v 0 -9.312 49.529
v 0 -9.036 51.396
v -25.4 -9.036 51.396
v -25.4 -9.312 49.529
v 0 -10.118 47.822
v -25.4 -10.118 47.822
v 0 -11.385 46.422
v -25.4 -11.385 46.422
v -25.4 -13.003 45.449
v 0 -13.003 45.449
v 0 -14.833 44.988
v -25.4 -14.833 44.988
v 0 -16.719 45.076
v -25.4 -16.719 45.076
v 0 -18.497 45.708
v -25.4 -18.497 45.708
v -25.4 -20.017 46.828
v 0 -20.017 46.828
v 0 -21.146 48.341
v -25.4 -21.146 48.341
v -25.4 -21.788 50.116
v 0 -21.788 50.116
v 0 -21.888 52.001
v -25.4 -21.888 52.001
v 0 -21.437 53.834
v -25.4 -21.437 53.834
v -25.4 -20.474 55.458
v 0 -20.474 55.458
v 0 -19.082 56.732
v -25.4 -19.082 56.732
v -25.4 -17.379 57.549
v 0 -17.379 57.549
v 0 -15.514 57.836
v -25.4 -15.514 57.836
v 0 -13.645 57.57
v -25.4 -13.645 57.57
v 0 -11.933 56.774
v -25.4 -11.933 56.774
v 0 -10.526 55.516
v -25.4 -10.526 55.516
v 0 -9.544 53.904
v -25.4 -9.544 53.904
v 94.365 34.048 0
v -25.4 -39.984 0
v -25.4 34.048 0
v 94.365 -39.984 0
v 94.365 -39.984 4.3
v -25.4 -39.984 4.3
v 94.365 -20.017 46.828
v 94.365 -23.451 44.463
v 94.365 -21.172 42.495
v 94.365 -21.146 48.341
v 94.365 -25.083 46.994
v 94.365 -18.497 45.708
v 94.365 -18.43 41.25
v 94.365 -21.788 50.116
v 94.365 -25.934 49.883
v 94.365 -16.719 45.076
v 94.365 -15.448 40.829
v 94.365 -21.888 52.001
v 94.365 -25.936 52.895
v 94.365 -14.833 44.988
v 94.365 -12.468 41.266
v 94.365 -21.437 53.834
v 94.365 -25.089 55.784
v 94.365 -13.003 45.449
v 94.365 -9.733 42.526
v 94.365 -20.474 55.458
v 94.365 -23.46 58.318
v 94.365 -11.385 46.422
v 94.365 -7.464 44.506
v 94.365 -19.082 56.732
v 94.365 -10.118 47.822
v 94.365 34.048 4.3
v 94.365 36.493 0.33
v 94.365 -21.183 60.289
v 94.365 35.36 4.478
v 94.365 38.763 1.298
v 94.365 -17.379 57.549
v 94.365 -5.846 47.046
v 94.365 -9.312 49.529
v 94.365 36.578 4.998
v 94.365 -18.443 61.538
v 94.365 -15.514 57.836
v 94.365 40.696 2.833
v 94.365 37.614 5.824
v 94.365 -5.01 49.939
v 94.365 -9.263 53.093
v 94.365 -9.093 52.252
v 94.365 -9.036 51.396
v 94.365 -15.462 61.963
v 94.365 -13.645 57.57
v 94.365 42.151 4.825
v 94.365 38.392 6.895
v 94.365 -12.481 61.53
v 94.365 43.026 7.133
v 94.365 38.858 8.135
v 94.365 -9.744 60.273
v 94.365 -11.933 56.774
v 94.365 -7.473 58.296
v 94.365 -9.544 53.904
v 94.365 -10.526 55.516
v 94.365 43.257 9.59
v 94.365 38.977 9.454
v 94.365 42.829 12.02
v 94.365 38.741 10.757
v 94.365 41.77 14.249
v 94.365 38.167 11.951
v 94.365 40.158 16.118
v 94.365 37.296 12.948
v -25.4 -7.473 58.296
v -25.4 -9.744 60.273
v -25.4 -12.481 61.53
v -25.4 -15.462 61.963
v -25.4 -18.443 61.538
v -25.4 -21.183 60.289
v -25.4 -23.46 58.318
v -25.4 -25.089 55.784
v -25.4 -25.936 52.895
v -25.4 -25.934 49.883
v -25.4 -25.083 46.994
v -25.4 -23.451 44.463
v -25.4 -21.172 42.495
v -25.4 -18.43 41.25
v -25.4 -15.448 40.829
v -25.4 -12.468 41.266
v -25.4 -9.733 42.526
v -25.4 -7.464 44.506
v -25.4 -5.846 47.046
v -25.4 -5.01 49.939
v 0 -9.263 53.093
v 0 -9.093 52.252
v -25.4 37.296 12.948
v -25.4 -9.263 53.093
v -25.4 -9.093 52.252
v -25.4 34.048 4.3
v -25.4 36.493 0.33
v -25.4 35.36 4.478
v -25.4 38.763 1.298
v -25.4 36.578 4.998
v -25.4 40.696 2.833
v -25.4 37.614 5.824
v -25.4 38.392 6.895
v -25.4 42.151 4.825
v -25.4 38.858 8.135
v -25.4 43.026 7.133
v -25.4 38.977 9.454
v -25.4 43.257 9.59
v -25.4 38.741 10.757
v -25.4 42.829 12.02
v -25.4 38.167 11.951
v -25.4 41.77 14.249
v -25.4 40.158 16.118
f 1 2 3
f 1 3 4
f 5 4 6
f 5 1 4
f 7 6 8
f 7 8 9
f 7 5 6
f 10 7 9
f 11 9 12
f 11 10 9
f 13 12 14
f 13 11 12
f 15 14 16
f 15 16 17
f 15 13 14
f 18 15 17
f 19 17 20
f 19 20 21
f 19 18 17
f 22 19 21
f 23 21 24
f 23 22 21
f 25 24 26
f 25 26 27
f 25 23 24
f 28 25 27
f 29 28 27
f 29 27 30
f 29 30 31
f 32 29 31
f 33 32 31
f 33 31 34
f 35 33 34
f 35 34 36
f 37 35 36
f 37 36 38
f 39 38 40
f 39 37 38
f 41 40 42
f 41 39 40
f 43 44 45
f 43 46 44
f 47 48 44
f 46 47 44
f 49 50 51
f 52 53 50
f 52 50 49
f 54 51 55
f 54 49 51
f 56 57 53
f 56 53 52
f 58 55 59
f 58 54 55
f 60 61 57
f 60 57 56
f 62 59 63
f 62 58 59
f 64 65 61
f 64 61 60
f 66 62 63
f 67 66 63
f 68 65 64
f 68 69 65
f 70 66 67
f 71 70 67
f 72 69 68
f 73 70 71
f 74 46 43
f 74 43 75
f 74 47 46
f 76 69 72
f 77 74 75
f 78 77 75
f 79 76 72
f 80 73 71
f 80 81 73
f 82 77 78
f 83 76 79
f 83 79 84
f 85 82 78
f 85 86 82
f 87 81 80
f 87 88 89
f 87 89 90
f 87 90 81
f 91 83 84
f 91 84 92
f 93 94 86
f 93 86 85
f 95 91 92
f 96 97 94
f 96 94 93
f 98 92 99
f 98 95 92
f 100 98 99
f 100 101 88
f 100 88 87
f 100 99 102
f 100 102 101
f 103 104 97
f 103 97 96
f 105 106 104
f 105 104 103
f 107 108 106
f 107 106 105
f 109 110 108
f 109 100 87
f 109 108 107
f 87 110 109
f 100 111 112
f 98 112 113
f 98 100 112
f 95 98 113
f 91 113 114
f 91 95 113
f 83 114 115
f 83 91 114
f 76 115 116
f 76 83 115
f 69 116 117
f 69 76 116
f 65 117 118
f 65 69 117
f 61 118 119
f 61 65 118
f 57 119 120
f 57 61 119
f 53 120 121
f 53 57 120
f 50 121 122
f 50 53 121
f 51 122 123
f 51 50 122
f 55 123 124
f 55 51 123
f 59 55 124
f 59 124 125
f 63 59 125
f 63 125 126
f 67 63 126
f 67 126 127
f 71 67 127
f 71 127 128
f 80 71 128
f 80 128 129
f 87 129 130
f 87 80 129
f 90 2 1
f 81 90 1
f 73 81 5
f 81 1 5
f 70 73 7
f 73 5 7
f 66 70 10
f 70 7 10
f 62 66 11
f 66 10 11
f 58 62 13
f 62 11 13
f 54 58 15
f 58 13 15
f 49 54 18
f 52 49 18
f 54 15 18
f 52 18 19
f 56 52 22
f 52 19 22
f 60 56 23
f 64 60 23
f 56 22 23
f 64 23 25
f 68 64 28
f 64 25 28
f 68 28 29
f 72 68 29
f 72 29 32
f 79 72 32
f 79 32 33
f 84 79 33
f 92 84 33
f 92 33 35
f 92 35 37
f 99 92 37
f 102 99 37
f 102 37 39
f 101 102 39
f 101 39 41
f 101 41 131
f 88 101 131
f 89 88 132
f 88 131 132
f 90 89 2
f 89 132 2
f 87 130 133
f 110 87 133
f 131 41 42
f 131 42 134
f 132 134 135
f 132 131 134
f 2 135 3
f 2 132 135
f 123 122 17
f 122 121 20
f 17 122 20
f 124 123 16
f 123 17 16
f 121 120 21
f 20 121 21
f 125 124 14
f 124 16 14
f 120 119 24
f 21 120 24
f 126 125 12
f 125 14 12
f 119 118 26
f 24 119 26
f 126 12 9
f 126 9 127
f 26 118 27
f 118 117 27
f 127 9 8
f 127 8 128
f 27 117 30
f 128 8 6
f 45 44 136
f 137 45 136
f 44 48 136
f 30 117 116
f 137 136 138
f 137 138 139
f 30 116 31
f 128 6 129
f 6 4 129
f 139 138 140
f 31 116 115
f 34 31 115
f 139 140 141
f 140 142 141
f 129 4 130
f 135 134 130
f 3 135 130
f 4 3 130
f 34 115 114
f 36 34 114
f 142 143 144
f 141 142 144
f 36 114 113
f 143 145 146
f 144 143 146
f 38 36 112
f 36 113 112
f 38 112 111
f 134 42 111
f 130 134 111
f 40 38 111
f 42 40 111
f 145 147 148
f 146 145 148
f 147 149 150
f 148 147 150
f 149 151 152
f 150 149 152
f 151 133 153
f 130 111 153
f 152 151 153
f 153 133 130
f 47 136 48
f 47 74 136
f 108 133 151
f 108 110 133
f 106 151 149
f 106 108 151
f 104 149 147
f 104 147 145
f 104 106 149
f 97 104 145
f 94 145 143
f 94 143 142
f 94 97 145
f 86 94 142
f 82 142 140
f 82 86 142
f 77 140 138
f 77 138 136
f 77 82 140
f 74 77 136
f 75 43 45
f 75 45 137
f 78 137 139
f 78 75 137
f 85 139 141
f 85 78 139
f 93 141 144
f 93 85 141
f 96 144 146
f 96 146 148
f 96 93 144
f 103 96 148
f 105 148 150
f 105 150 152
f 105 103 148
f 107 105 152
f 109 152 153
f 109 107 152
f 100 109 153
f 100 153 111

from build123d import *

# Parameters (mm, degrees)
F1_DEPTH = 94.3654105067
F2_DEPTH = 25.4


with BuildPart() as f1:
    # F0 (on Right) → F1 (new body)
    with BuildSketch(Plane.YZ):
        with BuildLine():
            Line((-39.9835929275, 0), (0, 0))
            Line((0, 0), (34.047730267, 0))
            ThreePointArc((34.047730267, 0), (42.6663665837, 5.9497380049), (40.1583202183, 16.1178242415))
            Line((40.1583202183, 16.1178242415), (-7.4729916735, 58.2961705104))
            ThreePointArc((-7.4729916735, 58.2961705104), (-5.570695265, 55.0765091724), (-4.9089710419, 51.3958744705))
            ThreePointArc((-4.9089710419, 51.3958744705), (-4.9342154485, 50.6658876775), (-5.0098280518, 49.939388722))
            Line((-5.0098280518, 49.939388722), (37.295550108, 12.9483202472))
            ThreePointArc((37.295550108, 12.9483202472), (38.6668473881, 7.4992614051), (34.047730267, 4.2998152785))
            Line((34.047730267, 4.2998152785), (0, 4.2998152785))
            Line((0, 4.2998152785), (-39.9835929275, 4.2998152785))
            Line((-39.9835929275, 4.2998152785), (-39.9835929275, 0))
        make_face()
        with BuildLine():
            ThreePointArc((-4.9089710419, 51.3958744705), (-5.570695265, 55.0765091724), (-7.4729916735, 58.2961705104))
            ThreePointArc((-7.4729916735, 58.2961705104), (-25.6119539634, 48.4083066672), (-5.0098280518, 49.939388722))
            ThreePointArc((-5.0098280518, 49.939388722), (-4.9342154485, 50.6658876775), (-4.9089710419, 51.3958744705))
        make_face()
        with BuildLine():
            ThreePointArc((-9.0356460446, 51.3958744705), (-21.7879990052, 50.1162425544), (-9.5441434252, 53.9041132503))
            ThreePointArc((-9.5441434252, 53.9041132503), (-9.164050414, 52.6755063865), (-9.0356460446, 51.3958744705))
        make_face(mode=Mode.SUBTRACT)
    extrude(amount=F1_DEPTH)

    # F2 (add): a face of the model
    f2_faces = [f1.faces().sort_by_distance(p)[0] for p in [
        (0, -2.9679313302, 1.0377729525),
    ]]
    extrude(f2_faces, amount=F2_DEPTH)


solid = f1.part
